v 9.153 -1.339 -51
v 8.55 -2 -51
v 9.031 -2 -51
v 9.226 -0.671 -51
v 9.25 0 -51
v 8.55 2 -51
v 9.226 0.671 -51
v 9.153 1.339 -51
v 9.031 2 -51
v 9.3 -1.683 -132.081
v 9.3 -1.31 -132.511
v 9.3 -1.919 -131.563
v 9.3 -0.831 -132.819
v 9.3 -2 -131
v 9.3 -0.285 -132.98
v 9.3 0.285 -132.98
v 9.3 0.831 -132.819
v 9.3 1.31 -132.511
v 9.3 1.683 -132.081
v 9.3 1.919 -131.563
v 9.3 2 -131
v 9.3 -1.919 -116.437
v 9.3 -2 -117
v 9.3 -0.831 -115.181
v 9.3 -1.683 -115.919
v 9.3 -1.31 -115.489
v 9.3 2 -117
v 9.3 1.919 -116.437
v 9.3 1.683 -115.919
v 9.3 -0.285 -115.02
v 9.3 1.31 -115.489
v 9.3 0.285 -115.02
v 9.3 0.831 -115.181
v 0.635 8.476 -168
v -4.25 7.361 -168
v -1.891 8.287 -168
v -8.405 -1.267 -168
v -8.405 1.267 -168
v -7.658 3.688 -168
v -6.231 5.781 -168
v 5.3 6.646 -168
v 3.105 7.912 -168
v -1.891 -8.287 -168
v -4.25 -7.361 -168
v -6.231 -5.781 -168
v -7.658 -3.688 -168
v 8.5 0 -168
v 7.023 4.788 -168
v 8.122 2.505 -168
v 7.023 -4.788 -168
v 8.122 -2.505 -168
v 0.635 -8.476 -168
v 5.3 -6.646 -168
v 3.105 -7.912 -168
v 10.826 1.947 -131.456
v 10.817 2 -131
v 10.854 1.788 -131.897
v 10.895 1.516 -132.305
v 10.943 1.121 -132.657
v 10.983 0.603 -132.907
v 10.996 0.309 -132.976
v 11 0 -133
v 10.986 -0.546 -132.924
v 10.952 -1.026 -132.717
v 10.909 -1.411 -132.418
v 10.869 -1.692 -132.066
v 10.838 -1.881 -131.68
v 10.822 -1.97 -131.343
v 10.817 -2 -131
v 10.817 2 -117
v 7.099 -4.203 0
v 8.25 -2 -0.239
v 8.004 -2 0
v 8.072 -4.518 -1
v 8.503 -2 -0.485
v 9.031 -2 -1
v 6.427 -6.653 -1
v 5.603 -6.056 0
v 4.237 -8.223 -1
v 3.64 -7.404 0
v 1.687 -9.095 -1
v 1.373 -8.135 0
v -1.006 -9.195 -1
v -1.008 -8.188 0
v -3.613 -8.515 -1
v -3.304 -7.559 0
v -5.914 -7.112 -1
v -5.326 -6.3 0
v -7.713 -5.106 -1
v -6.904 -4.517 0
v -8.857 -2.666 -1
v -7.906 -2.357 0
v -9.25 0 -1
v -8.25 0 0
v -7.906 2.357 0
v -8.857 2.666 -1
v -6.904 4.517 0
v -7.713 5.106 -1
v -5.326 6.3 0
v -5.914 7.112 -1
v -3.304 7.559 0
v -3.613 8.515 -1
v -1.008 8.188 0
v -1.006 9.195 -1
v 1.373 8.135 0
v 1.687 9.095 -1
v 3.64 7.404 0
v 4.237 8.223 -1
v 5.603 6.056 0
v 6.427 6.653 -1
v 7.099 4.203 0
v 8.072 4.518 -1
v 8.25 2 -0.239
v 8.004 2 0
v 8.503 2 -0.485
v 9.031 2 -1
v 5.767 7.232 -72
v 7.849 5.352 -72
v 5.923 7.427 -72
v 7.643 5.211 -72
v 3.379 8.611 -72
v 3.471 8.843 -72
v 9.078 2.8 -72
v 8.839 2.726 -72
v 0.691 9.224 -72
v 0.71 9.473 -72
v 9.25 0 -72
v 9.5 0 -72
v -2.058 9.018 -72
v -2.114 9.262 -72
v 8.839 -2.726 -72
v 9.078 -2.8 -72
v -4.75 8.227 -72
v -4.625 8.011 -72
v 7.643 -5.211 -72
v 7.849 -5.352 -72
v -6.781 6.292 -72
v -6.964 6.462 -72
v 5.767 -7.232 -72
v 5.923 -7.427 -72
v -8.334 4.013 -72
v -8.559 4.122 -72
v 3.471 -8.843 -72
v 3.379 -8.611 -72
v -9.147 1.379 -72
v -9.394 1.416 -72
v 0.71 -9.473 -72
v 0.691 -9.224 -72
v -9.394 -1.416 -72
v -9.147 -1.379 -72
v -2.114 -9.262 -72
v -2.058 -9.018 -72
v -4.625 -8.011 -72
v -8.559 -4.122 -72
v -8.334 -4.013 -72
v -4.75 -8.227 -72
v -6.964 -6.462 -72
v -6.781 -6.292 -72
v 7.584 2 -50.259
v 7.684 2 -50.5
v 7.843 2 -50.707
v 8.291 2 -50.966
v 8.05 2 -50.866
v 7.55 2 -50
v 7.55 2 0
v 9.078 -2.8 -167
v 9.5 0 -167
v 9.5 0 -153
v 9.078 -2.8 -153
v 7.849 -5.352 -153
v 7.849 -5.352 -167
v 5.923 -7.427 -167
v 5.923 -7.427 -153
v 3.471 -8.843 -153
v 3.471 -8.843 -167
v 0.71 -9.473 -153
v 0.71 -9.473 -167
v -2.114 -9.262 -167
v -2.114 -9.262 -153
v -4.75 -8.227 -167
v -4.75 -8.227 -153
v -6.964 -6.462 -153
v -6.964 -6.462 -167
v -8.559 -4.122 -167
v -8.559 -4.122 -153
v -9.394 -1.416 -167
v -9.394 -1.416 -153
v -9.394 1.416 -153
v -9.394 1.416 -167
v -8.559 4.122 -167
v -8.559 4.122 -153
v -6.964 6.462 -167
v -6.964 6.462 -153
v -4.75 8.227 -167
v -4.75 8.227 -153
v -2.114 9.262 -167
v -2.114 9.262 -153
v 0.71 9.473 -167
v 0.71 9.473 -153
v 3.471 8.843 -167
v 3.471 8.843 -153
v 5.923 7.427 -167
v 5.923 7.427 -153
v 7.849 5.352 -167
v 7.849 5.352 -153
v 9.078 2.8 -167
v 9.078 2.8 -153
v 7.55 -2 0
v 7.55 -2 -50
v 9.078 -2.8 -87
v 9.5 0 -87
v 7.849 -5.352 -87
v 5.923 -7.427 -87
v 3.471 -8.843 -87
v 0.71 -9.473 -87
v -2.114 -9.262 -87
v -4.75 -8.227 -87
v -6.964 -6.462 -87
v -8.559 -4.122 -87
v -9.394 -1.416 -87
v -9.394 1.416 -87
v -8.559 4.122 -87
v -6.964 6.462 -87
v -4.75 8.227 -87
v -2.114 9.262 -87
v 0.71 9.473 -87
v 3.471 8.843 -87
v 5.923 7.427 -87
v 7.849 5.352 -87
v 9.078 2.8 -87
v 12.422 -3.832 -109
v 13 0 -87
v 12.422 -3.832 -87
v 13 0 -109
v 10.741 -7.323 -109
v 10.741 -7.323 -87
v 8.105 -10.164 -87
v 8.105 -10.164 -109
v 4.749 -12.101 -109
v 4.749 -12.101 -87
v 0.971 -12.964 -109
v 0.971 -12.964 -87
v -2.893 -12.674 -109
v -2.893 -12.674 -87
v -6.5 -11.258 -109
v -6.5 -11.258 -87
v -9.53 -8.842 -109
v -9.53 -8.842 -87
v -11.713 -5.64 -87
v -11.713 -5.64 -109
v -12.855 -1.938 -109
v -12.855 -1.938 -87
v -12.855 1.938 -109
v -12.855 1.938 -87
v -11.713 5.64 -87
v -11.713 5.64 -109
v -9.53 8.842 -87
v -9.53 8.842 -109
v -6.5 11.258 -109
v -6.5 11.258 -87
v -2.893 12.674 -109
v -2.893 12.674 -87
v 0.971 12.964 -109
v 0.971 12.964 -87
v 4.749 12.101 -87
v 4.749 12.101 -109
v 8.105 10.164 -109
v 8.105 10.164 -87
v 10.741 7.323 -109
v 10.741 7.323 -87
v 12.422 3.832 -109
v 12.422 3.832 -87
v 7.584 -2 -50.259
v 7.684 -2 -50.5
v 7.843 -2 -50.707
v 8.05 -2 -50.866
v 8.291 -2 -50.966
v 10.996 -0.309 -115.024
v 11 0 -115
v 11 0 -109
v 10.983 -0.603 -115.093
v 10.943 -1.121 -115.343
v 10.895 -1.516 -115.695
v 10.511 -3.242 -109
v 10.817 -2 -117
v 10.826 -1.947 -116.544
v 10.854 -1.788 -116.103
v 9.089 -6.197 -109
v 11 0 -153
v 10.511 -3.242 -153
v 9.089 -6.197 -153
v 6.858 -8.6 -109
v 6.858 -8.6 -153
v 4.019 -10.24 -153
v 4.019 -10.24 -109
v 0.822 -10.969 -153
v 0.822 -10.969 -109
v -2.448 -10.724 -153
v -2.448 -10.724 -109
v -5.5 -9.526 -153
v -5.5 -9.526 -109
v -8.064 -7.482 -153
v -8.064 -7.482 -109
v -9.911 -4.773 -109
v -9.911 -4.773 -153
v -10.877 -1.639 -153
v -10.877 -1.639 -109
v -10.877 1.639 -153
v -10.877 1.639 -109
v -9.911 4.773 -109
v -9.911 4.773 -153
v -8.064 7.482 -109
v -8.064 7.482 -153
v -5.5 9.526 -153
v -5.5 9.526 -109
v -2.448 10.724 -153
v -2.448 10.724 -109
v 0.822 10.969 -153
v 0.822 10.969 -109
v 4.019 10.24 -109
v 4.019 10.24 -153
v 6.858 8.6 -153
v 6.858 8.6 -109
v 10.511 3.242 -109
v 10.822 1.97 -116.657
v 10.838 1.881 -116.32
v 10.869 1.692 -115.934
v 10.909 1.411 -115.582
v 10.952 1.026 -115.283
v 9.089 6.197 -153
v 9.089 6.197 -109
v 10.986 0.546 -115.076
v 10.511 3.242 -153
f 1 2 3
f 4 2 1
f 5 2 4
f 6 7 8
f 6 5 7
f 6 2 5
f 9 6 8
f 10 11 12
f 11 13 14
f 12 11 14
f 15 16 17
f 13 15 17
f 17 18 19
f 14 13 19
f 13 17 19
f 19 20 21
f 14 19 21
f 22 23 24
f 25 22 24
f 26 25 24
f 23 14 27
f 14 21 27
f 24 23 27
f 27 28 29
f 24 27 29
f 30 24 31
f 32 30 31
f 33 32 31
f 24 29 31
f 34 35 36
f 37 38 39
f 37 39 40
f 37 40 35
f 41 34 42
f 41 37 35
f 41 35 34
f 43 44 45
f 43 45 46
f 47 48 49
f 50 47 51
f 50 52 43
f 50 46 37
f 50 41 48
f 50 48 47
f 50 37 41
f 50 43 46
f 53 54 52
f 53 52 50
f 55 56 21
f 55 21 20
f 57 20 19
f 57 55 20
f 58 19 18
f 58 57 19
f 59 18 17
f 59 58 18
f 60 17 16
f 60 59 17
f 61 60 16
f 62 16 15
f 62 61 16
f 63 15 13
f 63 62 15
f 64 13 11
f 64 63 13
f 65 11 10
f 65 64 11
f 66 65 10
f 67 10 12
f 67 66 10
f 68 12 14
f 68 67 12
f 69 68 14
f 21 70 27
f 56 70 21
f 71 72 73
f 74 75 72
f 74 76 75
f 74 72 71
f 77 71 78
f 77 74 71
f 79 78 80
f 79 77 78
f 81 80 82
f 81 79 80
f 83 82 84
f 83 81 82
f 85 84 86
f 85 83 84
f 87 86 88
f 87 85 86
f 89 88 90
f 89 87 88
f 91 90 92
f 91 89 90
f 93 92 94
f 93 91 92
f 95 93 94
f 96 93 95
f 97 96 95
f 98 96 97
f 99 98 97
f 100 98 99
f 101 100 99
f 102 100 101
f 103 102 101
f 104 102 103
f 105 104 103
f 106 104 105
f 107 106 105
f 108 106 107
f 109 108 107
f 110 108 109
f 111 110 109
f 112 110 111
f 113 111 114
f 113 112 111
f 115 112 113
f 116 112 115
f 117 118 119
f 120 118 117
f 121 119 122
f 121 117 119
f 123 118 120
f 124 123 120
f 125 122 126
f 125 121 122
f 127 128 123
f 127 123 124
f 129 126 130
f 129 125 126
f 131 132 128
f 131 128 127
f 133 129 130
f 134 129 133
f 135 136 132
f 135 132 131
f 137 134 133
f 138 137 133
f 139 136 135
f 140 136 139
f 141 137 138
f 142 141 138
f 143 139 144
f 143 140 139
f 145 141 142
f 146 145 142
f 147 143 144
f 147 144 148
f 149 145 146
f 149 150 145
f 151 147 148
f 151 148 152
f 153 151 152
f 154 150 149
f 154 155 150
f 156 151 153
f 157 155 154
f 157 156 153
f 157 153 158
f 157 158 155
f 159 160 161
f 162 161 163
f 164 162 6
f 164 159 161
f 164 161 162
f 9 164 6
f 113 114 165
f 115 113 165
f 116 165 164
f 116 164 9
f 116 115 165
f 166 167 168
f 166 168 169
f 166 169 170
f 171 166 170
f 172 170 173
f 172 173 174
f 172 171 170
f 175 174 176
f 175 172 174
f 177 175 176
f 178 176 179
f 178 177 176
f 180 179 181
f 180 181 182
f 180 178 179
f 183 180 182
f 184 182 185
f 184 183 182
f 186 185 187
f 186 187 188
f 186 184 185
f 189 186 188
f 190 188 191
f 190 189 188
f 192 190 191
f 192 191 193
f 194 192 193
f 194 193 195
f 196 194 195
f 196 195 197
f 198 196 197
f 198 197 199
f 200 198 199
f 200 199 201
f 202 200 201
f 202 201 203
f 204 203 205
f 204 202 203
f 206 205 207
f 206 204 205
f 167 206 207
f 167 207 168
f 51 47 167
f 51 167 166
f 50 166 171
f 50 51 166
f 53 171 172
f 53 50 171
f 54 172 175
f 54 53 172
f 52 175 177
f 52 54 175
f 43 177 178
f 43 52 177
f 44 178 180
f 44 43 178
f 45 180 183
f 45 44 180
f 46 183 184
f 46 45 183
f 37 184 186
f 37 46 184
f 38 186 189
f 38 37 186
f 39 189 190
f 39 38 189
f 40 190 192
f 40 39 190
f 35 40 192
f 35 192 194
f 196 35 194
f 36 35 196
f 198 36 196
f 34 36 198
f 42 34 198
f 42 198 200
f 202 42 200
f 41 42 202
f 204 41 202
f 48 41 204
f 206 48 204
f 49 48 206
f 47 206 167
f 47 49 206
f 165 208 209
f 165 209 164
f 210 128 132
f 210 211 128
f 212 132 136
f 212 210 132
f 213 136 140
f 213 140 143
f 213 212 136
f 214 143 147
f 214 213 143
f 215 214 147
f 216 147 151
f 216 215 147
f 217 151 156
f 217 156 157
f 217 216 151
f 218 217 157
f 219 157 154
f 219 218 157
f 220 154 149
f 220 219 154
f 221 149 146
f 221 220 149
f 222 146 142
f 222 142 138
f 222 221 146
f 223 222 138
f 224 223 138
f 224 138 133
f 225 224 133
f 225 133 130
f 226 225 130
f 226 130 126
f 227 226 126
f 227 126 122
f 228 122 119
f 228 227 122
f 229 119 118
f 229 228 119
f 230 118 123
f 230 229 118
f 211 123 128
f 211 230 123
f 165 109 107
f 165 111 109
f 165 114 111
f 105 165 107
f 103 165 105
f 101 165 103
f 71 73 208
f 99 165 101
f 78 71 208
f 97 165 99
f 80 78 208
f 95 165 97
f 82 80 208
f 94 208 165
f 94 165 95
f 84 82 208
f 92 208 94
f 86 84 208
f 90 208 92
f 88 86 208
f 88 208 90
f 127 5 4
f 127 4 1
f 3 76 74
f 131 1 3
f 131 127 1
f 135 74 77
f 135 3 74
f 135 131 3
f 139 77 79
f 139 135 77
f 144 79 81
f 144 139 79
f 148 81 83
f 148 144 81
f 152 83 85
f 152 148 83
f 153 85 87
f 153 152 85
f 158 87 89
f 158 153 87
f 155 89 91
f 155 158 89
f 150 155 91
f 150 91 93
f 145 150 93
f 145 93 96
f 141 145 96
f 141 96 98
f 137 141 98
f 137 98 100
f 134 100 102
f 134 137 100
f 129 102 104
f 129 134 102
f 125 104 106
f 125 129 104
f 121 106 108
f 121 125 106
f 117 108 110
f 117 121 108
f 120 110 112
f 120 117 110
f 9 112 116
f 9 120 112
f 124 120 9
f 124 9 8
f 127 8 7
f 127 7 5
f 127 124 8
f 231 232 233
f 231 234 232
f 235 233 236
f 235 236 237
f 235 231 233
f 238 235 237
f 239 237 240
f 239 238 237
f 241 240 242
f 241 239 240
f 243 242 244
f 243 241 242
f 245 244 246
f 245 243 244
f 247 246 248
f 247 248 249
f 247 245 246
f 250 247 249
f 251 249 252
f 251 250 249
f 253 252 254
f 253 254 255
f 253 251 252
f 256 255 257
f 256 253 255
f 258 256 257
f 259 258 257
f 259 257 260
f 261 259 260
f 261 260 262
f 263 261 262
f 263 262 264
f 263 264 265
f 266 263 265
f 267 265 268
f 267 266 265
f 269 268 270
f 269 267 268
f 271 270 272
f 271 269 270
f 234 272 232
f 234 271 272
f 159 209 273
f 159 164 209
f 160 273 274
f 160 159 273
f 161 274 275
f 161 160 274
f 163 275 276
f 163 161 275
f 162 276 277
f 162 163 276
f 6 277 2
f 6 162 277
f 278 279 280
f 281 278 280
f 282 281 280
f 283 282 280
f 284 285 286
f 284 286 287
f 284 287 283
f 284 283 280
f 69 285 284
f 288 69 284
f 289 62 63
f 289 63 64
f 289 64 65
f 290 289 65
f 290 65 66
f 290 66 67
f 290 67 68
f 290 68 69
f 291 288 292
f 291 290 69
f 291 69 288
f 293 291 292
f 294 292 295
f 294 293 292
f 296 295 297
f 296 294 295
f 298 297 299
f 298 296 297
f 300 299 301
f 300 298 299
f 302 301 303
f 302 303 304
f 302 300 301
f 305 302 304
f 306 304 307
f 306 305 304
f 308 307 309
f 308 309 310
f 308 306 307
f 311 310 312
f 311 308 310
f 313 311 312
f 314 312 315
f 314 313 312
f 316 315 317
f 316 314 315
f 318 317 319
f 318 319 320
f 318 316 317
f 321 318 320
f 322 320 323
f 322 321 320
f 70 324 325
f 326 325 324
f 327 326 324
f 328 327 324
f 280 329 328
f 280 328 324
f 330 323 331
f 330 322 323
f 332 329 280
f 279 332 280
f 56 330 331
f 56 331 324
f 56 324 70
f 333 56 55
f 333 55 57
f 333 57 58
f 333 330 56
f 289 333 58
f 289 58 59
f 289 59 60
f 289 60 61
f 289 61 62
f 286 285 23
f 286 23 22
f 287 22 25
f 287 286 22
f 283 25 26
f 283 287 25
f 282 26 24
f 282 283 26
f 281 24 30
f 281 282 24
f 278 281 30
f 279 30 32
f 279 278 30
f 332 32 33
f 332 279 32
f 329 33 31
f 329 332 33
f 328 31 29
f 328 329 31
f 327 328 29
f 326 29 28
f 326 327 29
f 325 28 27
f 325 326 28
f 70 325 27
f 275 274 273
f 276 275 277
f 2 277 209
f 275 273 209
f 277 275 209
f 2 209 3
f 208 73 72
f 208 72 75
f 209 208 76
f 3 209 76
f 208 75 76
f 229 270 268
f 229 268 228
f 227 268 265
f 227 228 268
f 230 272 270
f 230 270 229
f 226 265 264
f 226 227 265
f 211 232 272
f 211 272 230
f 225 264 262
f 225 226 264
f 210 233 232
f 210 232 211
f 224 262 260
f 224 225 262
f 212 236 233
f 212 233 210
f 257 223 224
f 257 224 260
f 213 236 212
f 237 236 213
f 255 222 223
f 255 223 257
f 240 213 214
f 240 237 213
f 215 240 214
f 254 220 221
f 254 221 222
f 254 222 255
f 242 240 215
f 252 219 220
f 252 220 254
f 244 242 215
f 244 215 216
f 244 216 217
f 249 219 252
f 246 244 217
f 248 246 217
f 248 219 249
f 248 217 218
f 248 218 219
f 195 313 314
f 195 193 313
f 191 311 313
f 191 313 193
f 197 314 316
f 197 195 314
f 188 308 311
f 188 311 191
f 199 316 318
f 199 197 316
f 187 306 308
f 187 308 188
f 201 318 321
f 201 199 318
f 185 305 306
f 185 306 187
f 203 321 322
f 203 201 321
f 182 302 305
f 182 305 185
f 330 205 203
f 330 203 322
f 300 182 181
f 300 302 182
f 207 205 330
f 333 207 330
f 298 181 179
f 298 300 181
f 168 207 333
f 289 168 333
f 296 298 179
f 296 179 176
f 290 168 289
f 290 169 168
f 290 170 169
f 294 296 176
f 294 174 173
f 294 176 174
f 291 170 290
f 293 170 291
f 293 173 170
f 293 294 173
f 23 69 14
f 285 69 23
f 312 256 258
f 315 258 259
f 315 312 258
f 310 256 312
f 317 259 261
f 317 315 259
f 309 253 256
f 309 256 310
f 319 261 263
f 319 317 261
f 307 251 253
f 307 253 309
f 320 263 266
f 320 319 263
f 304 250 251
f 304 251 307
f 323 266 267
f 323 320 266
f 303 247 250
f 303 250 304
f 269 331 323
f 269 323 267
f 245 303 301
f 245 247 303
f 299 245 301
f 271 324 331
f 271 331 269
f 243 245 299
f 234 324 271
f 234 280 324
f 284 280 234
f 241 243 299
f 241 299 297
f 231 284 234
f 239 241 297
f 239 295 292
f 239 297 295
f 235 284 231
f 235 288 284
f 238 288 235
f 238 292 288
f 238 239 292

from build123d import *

# Parameters (mm, degrees)
SKETCH3_W          = 4.079746654
SKETCH3_H          = 4
CUT_EXTRUDE1_DEPTH = 51
CUT_EXTRUDE2_START = 11
CUT_EXTRUDE2_DEPTH = 1.7
CHAMFER1_SIZE      = 1
FILLET1_R          = 1


with BuildPart() as part:
    # Sketch2 → Revolve1 (revolve)
    with BuildSketch(Plane(origin=(0, 0, 0), x_dir=(1, 0, 0), z_dir=(0, 1, 0)), mode=Mode.PRIVATE) as revolve1_sk:
        Polygon((0, 0), (-9.25, 0), (-9.25, 72), (-9.5, 72), (-9.5, 87), (-13, 87), (-13, 109), (-11, 109), (-11, 153), (-9.5, 153), (-9.5, 168), (0, 168), align=None)
    revolve(revolve1_sk.sketch.rotate(Axis((0, 0, 0), (0, 0, -1)), 180), axis=Axis((0, 0, 0), (0, 0, -1)))

    # Sketch3 → Cut-Extrude1 (cut)
    with BuildSketch(Plane.XY):
        with Locations((9.589873327, 0)):
            Rectangle(SKETCH3_W, SKETCH3_H)
    extrude(amount=-CUT_EXTRUDE1_DEPTH, mode=Mode.SUBTRACT)

    # Sketch4 → Cut-Extrude2 (cut)
    with BuildSketch(Plane(origin=(0, 0, 0), x_dir=(0, 0, -1), z_dir=(1, 0, 0)).offset(CUT_EXTRUDE2_START)):
        with BuildLine():
            Line((117, 2), (131, 2))
            ThreePointArc((131, 2), (133, 0), (131, -2))
            Line((131, -2), (117, -2))
            ThreePointArc((117, -2), (115, 0), (117, 2))
        make_face()
    extrude(amount=-CUT_EXTRUDE2_DEPTH, mode=Mode.SUBTRACT)

    # Chamfer1
    chamfer1_edges = [part.edges().sort_by_distance(p)[0] for p in [
        (-9.25, 0, 0),
        (-9.5, 0, -168),
    ]]
    chamfer(chamfer1_edges, length=CHAMFER1_SIZE)

    # Fillet1
    fillet1_edges = [part.edges().sort_by_distance(p)[0] for p in [
        (7.55, 0, -51),
    ]]
    fillet(fillet1_edges, radius=FILLET1_R)


solid = part.part
